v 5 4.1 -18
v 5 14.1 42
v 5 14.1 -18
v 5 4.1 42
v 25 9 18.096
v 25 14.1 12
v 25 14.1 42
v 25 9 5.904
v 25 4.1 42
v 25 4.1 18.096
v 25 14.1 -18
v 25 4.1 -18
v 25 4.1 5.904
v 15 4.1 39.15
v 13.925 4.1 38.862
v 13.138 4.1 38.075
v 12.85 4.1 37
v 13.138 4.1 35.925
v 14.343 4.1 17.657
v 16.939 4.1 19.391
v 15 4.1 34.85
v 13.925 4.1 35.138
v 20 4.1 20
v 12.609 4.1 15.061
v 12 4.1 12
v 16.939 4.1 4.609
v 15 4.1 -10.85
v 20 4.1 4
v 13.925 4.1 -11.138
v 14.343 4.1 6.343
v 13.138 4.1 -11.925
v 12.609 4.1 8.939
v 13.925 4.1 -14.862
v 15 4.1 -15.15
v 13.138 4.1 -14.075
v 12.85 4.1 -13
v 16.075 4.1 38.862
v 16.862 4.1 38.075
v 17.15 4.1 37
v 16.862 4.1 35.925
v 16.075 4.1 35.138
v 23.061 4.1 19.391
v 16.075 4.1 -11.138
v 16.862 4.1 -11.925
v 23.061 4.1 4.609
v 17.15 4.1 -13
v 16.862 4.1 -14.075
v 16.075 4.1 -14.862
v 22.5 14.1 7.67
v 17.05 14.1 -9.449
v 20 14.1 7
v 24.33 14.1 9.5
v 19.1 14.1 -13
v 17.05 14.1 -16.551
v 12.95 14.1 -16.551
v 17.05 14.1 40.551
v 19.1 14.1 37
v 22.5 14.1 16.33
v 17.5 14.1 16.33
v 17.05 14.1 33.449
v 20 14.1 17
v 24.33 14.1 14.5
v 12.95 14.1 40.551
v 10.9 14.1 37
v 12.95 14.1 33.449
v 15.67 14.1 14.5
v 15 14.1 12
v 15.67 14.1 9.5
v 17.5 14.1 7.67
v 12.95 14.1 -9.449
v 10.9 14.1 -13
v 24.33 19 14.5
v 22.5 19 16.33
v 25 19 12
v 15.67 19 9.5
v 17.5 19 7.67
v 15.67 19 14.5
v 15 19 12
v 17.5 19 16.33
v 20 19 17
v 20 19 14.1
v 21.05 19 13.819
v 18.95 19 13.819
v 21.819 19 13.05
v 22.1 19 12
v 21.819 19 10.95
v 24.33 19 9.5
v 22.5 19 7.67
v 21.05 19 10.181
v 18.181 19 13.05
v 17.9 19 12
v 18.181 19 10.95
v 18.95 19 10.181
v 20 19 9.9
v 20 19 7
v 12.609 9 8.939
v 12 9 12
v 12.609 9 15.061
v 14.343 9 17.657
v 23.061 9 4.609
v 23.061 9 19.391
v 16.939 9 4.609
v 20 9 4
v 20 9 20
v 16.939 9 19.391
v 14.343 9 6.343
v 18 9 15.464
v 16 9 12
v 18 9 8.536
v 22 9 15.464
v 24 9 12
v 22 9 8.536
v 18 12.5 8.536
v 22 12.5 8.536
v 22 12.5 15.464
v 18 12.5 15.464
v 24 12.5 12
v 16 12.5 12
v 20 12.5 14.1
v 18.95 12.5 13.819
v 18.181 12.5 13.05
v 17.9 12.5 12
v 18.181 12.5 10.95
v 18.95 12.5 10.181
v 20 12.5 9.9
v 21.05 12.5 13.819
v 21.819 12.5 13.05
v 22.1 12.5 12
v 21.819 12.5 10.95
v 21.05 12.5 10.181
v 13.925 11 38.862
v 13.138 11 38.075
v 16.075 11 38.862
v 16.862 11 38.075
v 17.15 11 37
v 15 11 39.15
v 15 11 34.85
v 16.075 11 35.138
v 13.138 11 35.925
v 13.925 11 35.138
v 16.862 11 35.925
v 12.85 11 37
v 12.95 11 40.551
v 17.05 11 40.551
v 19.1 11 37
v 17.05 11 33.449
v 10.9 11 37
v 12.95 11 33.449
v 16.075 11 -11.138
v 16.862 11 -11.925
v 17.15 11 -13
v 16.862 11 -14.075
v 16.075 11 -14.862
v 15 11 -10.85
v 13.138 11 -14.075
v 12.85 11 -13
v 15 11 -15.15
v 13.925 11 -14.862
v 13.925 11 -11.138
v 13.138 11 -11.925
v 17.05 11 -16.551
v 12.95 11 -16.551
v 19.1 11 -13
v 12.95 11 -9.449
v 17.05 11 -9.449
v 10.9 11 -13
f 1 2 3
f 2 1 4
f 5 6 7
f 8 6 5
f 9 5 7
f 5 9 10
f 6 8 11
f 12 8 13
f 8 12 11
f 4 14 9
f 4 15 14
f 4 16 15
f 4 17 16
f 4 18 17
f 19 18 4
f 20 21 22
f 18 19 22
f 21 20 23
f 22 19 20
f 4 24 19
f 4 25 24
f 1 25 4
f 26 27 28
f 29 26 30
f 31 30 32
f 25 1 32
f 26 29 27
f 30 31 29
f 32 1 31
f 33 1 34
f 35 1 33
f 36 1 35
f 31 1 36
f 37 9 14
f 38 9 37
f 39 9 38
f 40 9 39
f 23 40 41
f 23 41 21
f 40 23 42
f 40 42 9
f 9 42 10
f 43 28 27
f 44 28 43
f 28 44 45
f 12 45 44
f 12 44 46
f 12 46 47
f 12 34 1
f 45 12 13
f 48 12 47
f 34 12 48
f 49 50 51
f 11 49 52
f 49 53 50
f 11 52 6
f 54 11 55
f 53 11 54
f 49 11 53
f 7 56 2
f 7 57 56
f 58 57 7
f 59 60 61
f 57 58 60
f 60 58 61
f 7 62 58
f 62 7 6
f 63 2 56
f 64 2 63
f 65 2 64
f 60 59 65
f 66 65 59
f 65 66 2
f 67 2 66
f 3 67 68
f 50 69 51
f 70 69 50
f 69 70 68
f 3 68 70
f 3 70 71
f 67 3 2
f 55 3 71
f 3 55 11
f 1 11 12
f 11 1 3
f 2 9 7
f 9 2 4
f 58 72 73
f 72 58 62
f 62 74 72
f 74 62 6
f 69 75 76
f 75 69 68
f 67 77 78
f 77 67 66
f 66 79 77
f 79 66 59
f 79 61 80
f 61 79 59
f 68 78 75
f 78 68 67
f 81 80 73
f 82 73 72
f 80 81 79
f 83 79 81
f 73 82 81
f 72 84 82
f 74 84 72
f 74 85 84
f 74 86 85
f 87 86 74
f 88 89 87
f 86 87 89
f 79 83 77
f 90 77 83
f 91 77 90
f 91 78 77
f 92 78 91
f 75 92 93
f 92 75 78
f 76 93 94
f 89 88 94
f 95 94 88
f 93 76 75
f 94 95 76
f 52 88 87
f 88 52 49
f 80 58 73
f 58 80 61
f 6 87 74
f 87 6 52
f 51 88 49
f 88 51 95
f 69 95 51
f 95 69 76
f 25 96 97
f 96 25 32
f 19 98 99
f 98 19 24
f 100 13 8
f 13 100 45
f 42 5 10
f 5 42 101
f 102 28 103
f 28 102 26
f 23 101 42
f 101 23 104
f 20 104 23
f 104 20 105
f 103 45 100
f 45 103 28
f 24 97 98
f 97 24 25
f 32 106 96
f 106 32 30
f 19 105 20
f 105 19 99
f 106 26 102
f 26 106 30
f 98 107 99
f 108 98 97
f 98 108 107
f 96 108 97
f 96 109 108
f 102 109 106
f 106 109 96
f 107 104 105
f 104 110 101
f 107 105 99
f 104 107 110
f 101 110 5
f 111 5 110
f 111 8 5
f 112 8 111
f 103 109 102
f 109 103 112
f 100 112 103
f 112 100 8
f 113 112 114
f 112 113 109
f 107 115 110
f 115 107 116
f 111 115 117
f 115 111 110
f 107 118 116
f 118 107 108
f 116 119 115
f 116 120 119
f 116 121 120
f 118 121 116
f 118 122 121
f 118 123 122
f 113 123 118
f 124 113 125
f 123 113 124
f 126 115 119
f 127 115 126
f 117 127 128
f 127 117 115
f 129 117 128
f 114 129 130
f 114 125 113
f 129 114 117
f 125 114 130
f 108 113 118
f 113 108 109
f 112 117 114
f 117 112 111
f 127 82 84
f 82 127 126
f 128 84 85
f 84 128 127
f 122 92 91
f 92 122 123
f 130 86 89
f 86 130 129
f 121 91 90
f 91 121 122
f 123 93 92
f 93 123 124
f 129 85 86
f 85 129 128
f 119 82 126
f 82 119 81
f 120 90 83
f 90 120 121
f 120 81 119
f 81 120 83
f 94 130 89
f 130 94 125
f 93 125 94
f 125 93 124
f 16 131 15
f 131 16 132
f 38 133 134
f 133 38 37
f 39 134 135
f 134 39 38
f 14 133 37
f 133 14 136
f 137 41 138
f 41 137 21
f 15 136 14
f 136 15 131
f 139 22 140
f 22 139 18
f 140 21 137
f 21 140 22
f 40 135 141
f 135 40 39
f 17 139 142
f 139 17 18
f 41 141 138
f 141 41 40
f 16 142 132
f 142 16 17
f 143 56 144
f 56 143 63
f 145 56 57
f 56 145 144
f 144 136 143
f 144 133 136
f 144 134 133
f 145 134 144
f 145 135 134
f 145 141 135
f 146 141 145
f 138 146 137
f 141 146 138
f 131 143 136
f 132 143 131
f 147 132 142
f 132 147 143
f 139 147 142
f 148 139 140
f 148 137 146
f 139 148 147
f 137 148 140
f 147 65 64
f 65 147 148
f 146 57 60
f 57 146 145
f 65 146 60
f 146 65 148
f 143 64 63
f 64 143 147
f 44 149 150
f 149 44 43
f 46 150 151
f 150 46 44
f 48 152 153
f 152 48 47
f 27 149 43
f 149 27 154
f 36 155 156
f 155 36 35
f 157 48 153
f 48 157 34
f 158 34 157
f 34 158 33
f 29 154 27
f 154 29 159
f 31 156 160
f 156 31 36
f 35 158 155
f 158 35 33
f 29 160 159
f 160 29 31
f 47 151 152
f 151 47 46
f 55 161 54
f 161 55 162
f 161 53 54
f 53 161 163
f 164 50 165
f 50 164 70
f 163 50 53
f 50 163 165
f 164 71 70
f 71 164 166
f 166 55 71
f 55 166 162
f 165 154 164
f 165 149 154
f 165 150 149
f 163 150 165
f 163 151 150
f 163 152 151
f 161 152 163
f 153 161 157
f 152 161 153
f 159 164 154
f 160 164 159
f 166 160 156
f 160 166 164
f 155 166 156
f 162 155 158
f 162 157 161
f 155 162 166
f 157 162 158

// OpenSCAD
difference() {
union() {
	//import_stl("C:\dev\MakerGear\MG Bot\brut\brut head\gearstruderbnoextruder.stl");
	translate(v=[5,14.1,-18]) rotate (a=[90,0,0]) cube(size=[20, 60, 10]);
	translate (v=[20,9+10,12]) rotate (a=[90,0,0]) cylinder(h=5, r=5, $fn=12);
}
	//remove edge excess
	translate(v=[25,42,22]) rotate (a=[90,0,0]) cube(size=[5,4, 20]);

	//filament hole
	translate (v=[20,15,12]) rotate (a=[90,0,0]) cylinder(h=20, r=1.75, $fn=12);
	translate (v=[20,9,12]) rotate (a=[90,0,0]) cylinder(h=6, r=8, $fn=16);
	translate (v=[20,9+3.5,12]) rotate (a=[90,0,0]) cylinder(h=3.5, r=4, $fn=6);
	#translate (v=[20,9+12,12]) rotate (a=[90,0,0]) cylinder(h=15, r=2.1, $fn=12);

	//mounting holes
	translate (v=[15,15,37]) rotate (a=[90,0,0]) cylinder(h=20, r=2.15, $fn=12);
	translate (v=[15,15,37]) rotate (a=[90,0,0]) cylinder(h=4, r=4.1, $fn=6);

	translate (v=[15,15,-13]) rotate (a=[90,0,0]) cylinder(h=20, r=2.15, $fn=12);
	translate (v=[15,15,-13]) rotate (a=[90,0,0]) cylinder(h=4, r=4.1, $fn=6);
		
}







// translate (v=[0,0,0]) rotate (a=[0,0,0])
